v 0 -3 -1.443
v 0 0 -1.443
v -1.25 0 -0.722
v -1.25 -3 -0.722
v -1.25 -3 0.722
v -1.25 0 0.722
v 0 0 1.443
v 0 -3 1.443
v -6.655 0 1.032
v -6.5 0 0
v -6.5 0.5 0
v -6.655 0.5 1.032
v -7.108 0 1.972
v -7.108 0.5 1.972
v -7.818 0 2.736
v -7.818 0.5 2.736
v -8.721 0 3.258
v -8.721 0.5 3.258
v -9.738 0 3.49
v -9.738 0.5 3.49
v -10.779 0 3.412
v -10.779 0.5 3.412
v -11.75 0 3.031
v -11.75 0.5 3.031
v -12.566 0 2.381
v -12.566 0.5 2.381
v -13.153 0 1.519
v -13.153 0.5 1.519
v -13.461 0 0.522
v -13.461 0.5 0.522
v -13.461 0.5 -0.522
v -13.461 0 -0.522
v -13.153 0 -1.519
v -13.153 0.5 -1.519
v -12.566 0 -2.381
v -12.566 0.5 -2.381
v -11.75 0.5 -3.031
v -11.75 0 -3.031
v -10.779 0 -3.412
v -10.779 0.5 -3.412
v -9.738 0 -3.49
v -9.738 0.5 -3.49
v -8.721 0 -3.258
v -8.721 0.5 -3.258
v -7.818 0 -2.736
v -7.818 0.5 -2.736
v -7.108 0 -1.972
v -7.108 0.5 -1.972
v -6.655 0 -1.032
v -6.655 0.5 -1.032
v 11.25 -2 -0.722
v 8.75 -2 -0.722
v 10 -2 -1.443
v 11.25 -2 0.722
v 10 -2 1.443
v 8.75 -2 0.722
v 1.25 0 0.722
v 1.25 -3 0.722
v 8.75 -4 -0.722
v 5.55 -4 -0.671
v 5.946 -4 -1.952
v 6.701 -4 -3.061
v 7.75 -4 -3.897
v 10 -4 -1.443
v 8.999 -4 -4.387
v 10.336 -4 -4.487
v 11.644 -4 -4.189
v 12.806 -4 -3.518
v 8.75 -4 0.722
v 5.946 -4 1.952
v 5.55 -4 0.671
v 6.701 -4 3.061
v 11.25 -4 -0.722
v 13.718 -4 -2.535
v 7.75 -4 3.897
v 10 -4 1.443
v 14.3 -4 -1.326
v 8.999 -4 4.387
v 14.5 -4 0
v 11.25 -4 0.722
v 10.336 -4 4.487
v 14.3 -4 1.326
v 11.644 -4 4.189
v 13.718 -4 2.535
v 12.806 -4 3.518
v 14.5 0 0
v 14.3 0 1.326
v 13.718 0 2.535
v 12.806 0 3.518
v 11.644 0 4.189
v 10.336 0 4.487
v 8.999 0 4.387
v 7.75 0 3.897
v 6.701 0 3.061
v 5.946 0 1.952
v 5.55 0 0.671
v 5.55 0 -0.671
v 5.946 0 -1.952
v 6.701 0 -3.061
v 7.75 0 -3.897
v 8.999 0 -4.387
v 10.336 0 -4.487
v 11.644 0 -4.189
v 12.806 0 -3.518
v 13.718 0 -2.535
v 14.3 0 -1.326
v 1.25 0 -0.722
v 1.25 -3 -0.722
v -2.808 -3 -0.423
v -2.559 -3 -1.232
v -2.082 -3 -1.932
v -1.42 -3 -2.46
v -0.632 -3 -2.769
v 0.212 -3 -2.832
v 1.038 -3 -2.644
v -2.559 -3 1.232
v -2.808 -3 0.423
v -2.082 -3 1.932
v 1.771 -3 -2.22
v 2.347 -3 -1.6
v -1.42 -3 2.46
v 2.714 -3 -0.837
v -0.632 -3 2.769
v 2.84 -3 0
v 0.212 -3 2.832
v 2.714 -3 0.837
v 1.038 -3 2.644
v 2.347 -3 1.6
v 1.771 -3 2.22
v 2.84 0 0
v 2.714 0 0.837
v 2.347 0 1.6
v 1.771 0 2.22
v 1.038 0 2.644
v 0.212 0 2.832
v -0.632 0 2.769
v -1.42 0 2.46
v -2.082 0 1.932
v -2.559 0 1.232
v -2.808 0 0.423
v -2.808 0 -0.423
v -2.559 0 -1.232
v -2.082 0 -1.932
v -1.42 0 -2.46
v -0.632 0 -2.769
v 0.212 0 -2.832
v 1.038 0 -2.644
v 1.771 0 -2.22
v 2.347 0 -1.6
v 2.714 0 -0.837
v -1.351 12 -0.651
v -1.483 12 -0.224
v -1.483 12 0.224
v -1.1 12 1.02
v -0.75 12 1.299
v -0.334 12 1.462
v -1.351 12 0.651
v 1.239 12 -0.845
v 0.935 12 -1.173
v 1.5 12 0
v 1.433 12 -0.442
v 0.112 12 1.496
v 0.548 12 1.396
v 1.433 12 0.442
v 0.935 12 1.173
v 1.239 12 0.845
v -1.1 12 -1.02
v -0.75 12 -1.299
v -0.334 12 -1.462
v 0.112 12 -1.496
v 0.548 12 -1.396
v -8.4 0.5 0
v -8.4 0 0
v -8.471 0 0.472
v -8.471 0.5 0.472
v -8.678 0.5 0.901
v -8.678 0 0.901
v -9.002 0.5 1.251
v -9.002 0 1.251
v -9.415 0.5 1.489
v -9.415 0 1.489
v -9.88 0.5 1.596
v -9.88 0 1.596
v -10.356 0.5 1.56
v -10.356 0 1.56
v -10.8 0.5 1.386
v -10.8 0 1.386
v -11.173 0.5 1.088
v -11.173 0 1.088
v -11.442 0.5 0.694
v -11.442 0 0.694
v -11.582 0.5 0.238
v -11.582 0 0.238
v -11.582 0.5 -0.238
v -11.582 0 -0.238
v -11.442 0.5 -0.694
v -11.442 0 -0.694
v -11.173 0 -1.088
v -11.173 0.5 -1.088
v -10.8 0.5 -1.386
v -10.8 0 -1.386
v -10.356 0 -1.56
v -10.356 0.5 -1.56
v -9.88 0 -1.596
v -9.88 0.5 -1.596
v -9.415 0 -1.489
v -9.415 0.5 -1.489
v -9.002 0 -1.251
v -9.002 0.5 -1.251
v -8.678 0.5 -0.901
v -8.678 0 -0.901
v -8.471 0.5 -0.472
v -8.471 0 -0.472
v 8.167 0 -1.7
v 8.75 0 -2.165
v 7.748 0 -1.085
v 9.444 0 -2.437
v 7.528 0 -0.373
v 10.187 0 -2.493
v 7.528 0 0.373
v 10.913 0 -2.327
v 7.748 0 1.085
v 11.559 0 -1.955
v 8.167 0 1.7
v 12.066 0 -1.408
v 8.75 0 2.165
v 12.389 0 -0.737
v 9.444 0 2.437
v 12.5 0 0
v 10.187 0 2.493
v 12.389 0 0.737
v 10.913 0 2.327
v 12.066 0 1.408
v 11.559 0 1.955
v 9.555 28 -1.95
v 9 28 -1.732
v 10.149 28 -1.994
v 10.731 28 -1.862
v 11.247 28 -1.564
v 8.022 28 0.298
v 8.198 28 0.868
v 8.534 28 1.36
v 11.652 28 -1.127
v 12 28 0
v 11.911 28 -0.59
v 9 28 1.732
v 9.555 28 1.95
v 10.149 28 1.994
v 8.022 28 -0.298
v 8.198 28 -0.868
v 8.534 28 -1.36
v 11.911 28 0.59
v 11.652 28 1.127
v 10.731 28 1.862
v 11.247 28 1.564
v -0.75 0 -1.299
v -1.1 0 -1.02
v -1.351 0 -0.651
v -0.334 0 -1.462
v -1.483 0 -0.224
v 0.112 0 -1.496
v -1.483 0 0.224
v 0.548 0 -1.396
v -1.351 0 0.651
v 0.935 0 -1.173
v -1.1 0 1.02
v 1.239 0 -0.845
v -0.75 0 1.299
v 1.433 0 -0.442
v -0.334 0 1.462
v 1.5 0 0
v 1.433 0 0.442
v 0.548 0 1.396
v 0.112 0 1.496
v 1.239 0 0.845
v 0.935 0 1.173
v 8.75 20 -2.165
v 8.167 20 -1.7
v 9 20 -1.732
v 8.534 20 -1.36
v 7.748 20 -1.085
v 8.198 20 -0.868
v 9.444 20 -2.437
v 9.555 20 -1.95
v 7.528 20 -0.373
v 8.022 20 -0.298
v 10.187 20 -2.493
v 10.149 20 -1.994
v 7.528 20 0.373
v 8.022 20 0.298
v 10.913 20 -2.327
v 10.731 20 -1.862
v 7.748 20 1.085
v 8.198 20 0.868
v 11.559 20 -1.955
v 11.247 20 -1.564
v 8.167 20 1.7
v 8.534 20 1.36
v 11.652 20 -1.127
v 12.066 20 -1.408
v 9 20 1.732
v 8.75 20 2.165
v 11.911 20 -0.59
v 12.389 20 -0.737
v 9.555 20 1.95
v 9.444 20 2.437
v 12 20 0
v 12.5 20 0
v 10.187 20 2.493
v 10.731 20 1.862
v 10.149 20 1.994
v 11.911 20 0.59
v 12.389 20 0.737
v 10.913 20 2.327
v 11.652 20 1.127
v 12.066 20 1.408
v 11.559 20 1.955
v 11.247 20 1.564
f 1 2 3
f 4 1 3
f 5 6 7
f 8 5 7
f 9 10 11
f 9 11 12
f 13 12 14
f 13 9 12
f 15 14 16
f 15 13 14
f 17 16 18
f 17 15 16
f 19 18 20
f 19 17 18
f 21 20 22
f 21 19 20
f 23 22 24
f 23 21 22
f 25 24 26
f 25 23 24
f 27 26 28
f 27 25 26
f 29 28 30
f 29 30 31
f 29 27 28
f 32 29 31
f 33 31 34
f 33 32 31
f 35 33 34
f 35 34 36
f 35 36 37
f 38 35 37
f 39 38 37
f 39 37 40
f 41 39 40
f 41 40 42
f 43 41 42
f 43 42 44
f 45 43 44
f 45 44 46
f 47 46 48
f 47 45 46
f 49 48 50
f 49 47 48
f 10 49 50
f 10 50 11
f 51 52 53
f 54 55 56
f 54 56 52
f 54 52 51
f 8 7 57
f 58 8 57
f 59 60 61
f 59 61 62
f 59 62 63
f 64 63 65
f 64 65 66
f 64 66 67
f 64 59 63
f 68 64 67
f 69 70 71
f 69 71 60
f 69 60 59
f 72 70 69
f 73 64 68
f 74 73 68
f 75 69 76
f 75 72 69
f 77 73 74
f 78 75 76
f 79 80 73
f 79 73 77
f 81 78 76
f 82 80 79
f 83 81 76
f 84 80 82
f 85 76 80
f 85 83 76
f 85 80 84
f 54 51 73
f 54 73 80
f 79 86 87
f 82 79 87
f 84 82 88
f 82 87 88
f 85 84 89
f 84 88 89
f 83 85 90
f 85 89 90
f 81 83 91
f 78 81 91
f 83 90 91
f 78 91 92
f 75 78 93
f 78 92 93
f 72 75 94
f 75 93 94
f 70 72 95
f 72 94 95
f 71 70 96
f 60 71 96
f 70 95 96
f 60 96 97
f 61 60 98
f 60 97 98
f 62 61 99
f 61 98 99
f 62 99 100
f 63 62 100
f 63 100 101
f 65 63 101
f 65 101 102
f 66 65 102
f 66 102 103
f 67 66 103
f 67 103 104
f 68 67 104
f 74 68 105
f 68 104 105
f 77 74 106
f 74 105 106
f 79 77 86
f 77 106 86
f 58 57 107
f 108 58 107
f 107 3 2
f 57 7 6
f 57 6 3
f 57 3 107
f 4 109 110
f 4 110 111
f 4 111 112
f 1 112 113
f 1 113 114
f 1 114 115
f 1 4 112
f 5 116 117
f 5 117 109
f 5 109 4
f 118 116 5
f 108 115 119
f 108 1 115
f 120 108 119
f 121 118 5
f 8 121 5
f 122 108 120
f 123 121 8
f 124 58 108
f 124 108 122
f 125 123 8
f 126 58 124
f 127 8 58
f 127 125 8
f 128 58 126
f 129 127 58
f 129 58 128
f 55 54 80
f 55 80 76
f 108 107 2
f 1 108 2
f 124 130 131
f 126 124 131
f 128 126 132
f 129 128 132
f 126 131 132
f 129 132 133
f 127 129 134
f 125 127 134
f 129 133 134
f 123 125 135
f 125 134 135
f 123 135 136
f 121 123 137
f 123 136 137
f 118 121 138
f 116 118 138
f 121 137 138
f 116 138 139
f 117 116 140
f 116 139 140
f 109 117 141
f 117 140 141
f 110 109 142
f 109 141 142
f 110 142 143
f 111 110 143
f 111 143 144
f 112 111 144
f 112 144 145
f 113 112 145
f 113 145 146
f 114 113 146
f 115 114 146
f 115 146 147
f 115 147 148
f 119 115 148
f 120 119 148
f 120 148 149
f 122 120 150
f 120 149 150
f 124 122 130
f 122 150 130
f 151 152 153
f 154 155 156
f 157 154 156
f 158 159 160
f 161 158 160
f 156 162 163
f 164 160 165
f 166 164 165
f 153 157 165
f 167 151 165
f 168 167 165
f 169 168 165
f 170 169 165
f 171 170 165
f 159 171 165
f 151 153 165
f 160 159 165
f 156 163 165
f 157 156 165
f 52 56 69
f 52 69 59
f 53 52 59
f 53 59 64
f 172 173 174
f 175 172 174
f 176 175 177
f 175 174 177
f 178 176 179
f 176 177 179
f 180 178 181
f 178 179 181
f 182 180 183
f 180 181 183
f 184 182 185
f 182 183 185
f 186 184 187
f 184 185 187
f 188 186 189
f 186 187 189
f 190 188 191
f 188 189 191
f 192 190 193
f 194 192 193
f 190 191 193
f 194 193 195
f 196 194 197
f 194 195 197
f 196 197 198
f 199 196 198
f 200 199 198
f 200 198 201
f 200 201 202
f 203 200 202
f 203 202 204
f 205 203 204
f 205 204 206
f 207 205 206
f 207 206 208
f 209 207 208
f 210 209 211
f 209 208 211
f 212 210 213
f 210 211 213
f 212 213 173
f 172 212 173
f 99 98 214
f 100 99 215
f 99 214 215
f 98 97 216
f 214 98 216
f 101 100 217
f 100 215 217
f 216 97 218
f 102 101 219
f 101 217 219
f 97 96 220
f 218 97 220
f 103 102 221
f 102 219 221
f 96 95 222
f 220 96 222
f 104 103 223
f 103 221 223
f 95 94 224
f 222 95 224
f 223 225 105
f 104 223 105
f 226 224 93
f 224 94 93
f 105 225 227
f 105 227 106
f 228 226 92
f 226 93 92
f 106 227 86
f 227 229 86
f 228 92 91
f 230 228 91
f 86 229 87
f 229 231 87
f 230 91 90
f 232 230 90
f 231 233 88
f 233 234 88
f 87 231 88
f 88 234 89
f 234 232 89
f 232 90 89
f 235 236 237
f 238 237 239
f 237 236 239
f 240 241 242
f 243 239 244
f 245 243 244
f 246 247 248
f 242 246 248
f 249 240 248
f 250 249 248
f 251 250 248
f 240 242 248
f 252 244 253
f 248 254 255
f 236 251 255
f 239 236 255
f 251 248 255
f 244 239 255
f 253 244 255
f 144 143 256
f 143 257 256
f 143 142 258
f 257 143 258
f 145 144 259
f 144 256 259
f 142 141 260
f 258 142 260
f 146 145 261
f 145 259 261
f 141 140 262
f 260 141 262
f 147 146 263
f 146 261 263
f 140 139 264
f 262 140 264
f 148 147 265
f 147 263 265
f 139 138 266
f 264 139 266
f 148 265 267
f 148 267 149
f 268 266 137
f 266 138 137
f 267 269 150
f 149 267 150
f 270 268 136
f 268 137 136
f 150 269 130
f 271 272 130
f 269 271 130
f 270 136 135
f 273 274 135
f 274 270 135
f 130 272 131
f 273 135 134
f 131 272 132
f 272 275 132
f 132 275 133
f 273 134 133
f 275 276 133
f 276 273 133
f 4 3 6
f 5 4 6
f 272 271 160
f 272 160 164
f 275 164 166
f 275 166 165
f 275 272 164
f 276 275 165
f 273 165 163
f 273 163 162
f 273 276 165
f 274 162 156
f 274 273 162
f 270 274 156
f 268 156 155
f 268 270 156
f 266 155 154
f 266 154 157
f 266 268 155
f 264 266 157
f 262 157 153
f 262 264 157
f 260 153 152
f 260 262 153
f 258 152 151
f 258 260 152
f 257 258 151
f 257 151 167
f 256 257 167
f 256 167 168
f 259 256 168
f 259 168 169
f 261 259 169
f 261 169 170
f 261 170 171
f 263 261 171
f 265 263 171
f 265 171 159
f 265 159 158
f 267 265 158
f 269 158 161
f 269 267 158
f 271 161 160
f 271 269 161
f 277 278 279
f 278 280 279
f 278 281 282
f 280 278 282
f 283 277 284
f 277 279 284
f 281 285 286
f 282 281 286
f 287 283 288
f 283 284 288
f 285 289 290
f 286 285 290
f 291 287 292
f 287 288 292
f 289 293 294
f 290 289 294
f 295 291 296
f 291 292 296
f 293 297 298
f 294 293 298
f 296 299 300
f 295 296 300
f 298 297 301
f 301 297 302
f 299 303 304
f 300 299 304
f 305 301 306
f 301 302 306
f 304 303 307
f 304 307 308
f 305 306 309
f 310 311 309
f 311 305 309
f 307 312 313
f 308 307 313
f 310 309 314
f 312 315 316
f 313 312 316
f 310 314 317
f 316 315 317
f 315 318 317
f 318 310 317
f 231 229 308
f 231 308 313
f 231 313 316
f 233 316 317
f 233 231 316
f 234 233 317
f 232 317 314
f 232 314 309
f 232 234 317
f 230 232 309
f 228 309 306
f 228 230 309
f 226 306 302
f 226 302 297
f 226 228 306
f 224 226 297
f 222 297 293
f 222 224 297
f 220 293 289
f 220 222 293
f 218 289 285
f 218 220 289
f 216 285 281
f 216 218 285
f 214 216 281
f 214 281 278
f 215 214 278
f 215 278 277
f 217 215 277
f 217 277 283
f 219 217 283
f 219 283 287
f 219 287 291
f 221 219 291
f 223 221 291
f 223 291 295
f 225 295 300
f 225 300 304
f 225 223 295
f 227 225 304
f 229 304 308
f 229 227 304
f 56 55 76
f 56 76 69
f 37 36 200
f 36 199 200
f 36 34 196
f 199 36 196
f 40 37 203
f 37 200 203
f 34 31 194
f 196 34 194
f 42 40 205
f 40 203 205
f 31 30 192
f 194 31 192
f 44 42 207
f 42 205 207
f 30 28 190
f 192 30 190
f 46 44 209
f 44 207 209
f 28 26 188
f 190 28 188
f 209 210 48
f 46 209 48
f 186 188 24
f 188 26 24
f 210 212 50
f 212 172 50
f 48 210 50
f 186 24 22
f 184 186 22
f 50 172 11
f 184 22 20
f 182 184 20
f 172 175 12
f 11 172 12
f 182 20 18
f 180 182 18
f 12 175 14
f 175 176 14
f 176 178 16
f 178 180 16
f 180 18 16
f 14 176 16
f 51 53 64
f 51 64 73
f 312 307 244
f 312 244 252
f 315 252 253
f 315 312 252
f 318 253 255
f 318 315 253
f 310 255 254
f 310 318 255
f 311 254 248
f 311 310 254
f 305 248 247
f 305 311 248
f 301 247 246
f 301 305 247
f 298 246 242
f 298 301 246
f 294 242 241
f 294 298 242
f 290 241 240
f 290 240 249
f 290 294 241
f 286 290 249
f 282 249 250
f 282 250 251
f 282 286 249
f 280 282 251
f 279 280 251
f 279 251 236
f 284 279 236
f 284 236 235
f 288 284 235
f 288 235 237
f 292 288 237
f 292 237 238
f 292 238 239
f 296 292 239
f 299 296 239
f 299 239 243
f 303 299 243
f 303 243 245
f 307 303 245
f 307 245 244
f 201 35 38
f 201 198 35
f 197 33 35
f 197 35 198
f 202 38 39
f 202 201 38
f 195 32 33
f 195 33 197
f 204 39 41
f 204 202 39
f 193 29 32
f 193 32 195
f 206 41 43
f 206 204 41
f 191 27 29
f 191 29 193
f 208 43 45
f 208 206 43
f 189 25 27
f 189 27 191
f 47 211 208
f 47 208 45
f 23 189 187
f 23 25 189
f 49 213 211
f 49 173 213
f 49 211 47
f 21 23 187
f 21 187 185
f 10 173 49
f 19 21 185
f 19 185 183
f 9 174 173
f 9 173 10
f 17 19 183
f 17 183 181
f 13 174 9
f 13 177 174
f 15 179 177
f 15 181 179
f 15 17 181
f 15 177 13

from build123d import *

# Parameters (mm, degrees)
F0_R      = 1.5
F1_DEPTH  = 12
F0_R_2    = 2.84
F2_DEPTH  = 3
F3_START  = 1.9
F3_DEPTH  = 23.1
F4_R      = 4.5
F4_R_2    = 2.5
F4_R_3    = 2
F5_DEPTH  = 4
F6_DEPTH  = 20
F7_DEPTH  = 28
F8_R      = 3.5
F8_R_2    = 1.6
F9_DEPTH  = 0.5
F10_START = 2
F10_DEPTH = 2


with BuildPart() as f1:
    # F0 (on Front) → F1 (new body)
    with BuildSketch(Plane.XZ):
        Circle(F0_R)
        Polygon((0, 1.443375673), (1.25, 0.7216878365), (1.25, -0.7216878365), (0, -1.443375673), (-1.25, -0.7216878365), (-1.25, 0.7216878365), align=None, mode=Mode.SUBTRACT)
        Polygon((1.25, -0.7216878365), (1.25, 0.7216878365), (0, 1.443375673), (-1.25, 0.7216878365), (-1.25, -0.7216878365), (0, -1.443375673), align=None)
    extrude(amount=-F1_DEPTH)

    # F0 (on Front) → F2 (join)
    with BuildSketch(Plane.XZ):
        Circle(F0_R_2)
        Circle(F0_R, mode=Mode.SUBTRACT)
        Circle(F0_R)
        Polygon((0, 1.443375673), (1.25, 0.7216878365), (1.25, -0.7216878365), (0, -1.443375673), (-1.25, -0.7216878365), (-1.25, 0.7216878365), align=None, mode=Mode.SUBTRACT)
    extrude(amount=F2_DEPTH)

    # F0 (on Front) → F3 (cut)
    with BuildSketch(Plane.XZ.offset(F3_START)):
        Polygon((1.25, -0.7216878365), (1.25, 0.7216878365), (0, 1.443375673), (-1.25, 0.7216878365), (-1.25, -0.7216878365), (0, -1.443375673), align=None)
    extrude(amount=F3_DEPTH, mode=Mode.SUBTRACT)


with BuildPart() as f5:
    # F4 (on Front) → F5 (new body)
    with BuildSketch(Plane.XZ):
        with Locations((10, 0)):
            Circle(F4_R)
        with Locations((10, 0)):
            Circle(F4_R_2, mode=Mode.SUBTRACT)
        with Locations((10, 0)):
            Circle(F4_R_2)
        with Locations((10, 0)):
            Circle(F4_R_3, mode=Mode.SUBTRACT)
        with Locations((10, 0)):
            Circle(F4_R_3)
        Polygon((10, 1.443375673), (11.25, 0.7216878365), (11.25, -0.7216878365), (10, -1.443375673), (8.75, -0.7216878365), (8.75, 0.7216878365), align=None, mode=Mode.SUBTRACT)
        Polygon((11.25, -0.7216878365), (11.25, 0.7216878365), (10, 1.443375673), (8.75, 0.7216878365), (8.75, -0.7216878365), (10, -1.443375673), align=None)
    extrude(amount=F5_DEPTH)

    # F4 (on Front) → F6 (join)
    with BuildSketch(Plane.XZ):
        with Locations((10, 0)):
            Circle(F4_R_2)
        with Locations((10, 0)):
            Circle(F4_R_3, mode=Mode.SUBTRACT)
        with Locations((10, 0)):
            Circle(F4_R_3)
        Polygon((10, 1.443375673), (11.25, 0.7216878365), (11.25, -0.7216878365), (10, -1.443375673), (8.75, -0.7216878365), (8.75, 0.7216878365), align=None, mode=Mode.SUBTRACT)
        Polygon((11.25, -0.7216878365), (11.25, 0.7216878365), (10, 1.443375673), (8.75, 0.7216878365), (8.75, -0.7216878365), (10, -1.443375673), align=None)
    extrude(amount=-F6_DEPTH)

    # F4 (on Front) → F7 (join)
    with BuildSketch(Plane.XZ):
        with Locations((10, 0)):
            Circle(F4_R_3)
        Polygon((10, 1.443375673), (11.25, 0.7216878365), (11.25, -0.7216878365), (10, -1.443375673), (8.75, -0.7216878365), (8.75, 0.7216878365), align=None, mode=Mode.SUBTRACT)
        Polygon((11.25, -0.7216878365), (11.25, 0.7216878365), (10, 1.443375673), (8.75, 0.7216878365), (8.75, -0.7216878365), (10, -1.443375673), align=None)
    extrude(amount=-F7_DEPTH)

    # F4 (on Front) → F10 (cut)
    with BuildSketch(Plane.XZ.offset(F10_START)):
        Polygon((11.25, -0.7216878365), (11.25, 0.7216878365), (10, 1.443375673), (8.75, 0.7216878365), (8.75, -0.7216878365), (10, -1.443375673), align=None)
    extrude(amount=F10_DEPTH, mode=Mode.SUBTRACT)


with BuildPart() as f9:
    # F8 (on Front) → F9 (new body)
    with BuildSketch(Plane.XZ):
        with Locations((-10, 0)):
            Circle(F8_R)
        with Locations((-10, 0)):
            Circle(F8_R_2, mode=Mode.SUBTRACT)
    extrude(amount=-F9_DEPTH)


solid = Compound([f1.part, f5.part, f9.part])
